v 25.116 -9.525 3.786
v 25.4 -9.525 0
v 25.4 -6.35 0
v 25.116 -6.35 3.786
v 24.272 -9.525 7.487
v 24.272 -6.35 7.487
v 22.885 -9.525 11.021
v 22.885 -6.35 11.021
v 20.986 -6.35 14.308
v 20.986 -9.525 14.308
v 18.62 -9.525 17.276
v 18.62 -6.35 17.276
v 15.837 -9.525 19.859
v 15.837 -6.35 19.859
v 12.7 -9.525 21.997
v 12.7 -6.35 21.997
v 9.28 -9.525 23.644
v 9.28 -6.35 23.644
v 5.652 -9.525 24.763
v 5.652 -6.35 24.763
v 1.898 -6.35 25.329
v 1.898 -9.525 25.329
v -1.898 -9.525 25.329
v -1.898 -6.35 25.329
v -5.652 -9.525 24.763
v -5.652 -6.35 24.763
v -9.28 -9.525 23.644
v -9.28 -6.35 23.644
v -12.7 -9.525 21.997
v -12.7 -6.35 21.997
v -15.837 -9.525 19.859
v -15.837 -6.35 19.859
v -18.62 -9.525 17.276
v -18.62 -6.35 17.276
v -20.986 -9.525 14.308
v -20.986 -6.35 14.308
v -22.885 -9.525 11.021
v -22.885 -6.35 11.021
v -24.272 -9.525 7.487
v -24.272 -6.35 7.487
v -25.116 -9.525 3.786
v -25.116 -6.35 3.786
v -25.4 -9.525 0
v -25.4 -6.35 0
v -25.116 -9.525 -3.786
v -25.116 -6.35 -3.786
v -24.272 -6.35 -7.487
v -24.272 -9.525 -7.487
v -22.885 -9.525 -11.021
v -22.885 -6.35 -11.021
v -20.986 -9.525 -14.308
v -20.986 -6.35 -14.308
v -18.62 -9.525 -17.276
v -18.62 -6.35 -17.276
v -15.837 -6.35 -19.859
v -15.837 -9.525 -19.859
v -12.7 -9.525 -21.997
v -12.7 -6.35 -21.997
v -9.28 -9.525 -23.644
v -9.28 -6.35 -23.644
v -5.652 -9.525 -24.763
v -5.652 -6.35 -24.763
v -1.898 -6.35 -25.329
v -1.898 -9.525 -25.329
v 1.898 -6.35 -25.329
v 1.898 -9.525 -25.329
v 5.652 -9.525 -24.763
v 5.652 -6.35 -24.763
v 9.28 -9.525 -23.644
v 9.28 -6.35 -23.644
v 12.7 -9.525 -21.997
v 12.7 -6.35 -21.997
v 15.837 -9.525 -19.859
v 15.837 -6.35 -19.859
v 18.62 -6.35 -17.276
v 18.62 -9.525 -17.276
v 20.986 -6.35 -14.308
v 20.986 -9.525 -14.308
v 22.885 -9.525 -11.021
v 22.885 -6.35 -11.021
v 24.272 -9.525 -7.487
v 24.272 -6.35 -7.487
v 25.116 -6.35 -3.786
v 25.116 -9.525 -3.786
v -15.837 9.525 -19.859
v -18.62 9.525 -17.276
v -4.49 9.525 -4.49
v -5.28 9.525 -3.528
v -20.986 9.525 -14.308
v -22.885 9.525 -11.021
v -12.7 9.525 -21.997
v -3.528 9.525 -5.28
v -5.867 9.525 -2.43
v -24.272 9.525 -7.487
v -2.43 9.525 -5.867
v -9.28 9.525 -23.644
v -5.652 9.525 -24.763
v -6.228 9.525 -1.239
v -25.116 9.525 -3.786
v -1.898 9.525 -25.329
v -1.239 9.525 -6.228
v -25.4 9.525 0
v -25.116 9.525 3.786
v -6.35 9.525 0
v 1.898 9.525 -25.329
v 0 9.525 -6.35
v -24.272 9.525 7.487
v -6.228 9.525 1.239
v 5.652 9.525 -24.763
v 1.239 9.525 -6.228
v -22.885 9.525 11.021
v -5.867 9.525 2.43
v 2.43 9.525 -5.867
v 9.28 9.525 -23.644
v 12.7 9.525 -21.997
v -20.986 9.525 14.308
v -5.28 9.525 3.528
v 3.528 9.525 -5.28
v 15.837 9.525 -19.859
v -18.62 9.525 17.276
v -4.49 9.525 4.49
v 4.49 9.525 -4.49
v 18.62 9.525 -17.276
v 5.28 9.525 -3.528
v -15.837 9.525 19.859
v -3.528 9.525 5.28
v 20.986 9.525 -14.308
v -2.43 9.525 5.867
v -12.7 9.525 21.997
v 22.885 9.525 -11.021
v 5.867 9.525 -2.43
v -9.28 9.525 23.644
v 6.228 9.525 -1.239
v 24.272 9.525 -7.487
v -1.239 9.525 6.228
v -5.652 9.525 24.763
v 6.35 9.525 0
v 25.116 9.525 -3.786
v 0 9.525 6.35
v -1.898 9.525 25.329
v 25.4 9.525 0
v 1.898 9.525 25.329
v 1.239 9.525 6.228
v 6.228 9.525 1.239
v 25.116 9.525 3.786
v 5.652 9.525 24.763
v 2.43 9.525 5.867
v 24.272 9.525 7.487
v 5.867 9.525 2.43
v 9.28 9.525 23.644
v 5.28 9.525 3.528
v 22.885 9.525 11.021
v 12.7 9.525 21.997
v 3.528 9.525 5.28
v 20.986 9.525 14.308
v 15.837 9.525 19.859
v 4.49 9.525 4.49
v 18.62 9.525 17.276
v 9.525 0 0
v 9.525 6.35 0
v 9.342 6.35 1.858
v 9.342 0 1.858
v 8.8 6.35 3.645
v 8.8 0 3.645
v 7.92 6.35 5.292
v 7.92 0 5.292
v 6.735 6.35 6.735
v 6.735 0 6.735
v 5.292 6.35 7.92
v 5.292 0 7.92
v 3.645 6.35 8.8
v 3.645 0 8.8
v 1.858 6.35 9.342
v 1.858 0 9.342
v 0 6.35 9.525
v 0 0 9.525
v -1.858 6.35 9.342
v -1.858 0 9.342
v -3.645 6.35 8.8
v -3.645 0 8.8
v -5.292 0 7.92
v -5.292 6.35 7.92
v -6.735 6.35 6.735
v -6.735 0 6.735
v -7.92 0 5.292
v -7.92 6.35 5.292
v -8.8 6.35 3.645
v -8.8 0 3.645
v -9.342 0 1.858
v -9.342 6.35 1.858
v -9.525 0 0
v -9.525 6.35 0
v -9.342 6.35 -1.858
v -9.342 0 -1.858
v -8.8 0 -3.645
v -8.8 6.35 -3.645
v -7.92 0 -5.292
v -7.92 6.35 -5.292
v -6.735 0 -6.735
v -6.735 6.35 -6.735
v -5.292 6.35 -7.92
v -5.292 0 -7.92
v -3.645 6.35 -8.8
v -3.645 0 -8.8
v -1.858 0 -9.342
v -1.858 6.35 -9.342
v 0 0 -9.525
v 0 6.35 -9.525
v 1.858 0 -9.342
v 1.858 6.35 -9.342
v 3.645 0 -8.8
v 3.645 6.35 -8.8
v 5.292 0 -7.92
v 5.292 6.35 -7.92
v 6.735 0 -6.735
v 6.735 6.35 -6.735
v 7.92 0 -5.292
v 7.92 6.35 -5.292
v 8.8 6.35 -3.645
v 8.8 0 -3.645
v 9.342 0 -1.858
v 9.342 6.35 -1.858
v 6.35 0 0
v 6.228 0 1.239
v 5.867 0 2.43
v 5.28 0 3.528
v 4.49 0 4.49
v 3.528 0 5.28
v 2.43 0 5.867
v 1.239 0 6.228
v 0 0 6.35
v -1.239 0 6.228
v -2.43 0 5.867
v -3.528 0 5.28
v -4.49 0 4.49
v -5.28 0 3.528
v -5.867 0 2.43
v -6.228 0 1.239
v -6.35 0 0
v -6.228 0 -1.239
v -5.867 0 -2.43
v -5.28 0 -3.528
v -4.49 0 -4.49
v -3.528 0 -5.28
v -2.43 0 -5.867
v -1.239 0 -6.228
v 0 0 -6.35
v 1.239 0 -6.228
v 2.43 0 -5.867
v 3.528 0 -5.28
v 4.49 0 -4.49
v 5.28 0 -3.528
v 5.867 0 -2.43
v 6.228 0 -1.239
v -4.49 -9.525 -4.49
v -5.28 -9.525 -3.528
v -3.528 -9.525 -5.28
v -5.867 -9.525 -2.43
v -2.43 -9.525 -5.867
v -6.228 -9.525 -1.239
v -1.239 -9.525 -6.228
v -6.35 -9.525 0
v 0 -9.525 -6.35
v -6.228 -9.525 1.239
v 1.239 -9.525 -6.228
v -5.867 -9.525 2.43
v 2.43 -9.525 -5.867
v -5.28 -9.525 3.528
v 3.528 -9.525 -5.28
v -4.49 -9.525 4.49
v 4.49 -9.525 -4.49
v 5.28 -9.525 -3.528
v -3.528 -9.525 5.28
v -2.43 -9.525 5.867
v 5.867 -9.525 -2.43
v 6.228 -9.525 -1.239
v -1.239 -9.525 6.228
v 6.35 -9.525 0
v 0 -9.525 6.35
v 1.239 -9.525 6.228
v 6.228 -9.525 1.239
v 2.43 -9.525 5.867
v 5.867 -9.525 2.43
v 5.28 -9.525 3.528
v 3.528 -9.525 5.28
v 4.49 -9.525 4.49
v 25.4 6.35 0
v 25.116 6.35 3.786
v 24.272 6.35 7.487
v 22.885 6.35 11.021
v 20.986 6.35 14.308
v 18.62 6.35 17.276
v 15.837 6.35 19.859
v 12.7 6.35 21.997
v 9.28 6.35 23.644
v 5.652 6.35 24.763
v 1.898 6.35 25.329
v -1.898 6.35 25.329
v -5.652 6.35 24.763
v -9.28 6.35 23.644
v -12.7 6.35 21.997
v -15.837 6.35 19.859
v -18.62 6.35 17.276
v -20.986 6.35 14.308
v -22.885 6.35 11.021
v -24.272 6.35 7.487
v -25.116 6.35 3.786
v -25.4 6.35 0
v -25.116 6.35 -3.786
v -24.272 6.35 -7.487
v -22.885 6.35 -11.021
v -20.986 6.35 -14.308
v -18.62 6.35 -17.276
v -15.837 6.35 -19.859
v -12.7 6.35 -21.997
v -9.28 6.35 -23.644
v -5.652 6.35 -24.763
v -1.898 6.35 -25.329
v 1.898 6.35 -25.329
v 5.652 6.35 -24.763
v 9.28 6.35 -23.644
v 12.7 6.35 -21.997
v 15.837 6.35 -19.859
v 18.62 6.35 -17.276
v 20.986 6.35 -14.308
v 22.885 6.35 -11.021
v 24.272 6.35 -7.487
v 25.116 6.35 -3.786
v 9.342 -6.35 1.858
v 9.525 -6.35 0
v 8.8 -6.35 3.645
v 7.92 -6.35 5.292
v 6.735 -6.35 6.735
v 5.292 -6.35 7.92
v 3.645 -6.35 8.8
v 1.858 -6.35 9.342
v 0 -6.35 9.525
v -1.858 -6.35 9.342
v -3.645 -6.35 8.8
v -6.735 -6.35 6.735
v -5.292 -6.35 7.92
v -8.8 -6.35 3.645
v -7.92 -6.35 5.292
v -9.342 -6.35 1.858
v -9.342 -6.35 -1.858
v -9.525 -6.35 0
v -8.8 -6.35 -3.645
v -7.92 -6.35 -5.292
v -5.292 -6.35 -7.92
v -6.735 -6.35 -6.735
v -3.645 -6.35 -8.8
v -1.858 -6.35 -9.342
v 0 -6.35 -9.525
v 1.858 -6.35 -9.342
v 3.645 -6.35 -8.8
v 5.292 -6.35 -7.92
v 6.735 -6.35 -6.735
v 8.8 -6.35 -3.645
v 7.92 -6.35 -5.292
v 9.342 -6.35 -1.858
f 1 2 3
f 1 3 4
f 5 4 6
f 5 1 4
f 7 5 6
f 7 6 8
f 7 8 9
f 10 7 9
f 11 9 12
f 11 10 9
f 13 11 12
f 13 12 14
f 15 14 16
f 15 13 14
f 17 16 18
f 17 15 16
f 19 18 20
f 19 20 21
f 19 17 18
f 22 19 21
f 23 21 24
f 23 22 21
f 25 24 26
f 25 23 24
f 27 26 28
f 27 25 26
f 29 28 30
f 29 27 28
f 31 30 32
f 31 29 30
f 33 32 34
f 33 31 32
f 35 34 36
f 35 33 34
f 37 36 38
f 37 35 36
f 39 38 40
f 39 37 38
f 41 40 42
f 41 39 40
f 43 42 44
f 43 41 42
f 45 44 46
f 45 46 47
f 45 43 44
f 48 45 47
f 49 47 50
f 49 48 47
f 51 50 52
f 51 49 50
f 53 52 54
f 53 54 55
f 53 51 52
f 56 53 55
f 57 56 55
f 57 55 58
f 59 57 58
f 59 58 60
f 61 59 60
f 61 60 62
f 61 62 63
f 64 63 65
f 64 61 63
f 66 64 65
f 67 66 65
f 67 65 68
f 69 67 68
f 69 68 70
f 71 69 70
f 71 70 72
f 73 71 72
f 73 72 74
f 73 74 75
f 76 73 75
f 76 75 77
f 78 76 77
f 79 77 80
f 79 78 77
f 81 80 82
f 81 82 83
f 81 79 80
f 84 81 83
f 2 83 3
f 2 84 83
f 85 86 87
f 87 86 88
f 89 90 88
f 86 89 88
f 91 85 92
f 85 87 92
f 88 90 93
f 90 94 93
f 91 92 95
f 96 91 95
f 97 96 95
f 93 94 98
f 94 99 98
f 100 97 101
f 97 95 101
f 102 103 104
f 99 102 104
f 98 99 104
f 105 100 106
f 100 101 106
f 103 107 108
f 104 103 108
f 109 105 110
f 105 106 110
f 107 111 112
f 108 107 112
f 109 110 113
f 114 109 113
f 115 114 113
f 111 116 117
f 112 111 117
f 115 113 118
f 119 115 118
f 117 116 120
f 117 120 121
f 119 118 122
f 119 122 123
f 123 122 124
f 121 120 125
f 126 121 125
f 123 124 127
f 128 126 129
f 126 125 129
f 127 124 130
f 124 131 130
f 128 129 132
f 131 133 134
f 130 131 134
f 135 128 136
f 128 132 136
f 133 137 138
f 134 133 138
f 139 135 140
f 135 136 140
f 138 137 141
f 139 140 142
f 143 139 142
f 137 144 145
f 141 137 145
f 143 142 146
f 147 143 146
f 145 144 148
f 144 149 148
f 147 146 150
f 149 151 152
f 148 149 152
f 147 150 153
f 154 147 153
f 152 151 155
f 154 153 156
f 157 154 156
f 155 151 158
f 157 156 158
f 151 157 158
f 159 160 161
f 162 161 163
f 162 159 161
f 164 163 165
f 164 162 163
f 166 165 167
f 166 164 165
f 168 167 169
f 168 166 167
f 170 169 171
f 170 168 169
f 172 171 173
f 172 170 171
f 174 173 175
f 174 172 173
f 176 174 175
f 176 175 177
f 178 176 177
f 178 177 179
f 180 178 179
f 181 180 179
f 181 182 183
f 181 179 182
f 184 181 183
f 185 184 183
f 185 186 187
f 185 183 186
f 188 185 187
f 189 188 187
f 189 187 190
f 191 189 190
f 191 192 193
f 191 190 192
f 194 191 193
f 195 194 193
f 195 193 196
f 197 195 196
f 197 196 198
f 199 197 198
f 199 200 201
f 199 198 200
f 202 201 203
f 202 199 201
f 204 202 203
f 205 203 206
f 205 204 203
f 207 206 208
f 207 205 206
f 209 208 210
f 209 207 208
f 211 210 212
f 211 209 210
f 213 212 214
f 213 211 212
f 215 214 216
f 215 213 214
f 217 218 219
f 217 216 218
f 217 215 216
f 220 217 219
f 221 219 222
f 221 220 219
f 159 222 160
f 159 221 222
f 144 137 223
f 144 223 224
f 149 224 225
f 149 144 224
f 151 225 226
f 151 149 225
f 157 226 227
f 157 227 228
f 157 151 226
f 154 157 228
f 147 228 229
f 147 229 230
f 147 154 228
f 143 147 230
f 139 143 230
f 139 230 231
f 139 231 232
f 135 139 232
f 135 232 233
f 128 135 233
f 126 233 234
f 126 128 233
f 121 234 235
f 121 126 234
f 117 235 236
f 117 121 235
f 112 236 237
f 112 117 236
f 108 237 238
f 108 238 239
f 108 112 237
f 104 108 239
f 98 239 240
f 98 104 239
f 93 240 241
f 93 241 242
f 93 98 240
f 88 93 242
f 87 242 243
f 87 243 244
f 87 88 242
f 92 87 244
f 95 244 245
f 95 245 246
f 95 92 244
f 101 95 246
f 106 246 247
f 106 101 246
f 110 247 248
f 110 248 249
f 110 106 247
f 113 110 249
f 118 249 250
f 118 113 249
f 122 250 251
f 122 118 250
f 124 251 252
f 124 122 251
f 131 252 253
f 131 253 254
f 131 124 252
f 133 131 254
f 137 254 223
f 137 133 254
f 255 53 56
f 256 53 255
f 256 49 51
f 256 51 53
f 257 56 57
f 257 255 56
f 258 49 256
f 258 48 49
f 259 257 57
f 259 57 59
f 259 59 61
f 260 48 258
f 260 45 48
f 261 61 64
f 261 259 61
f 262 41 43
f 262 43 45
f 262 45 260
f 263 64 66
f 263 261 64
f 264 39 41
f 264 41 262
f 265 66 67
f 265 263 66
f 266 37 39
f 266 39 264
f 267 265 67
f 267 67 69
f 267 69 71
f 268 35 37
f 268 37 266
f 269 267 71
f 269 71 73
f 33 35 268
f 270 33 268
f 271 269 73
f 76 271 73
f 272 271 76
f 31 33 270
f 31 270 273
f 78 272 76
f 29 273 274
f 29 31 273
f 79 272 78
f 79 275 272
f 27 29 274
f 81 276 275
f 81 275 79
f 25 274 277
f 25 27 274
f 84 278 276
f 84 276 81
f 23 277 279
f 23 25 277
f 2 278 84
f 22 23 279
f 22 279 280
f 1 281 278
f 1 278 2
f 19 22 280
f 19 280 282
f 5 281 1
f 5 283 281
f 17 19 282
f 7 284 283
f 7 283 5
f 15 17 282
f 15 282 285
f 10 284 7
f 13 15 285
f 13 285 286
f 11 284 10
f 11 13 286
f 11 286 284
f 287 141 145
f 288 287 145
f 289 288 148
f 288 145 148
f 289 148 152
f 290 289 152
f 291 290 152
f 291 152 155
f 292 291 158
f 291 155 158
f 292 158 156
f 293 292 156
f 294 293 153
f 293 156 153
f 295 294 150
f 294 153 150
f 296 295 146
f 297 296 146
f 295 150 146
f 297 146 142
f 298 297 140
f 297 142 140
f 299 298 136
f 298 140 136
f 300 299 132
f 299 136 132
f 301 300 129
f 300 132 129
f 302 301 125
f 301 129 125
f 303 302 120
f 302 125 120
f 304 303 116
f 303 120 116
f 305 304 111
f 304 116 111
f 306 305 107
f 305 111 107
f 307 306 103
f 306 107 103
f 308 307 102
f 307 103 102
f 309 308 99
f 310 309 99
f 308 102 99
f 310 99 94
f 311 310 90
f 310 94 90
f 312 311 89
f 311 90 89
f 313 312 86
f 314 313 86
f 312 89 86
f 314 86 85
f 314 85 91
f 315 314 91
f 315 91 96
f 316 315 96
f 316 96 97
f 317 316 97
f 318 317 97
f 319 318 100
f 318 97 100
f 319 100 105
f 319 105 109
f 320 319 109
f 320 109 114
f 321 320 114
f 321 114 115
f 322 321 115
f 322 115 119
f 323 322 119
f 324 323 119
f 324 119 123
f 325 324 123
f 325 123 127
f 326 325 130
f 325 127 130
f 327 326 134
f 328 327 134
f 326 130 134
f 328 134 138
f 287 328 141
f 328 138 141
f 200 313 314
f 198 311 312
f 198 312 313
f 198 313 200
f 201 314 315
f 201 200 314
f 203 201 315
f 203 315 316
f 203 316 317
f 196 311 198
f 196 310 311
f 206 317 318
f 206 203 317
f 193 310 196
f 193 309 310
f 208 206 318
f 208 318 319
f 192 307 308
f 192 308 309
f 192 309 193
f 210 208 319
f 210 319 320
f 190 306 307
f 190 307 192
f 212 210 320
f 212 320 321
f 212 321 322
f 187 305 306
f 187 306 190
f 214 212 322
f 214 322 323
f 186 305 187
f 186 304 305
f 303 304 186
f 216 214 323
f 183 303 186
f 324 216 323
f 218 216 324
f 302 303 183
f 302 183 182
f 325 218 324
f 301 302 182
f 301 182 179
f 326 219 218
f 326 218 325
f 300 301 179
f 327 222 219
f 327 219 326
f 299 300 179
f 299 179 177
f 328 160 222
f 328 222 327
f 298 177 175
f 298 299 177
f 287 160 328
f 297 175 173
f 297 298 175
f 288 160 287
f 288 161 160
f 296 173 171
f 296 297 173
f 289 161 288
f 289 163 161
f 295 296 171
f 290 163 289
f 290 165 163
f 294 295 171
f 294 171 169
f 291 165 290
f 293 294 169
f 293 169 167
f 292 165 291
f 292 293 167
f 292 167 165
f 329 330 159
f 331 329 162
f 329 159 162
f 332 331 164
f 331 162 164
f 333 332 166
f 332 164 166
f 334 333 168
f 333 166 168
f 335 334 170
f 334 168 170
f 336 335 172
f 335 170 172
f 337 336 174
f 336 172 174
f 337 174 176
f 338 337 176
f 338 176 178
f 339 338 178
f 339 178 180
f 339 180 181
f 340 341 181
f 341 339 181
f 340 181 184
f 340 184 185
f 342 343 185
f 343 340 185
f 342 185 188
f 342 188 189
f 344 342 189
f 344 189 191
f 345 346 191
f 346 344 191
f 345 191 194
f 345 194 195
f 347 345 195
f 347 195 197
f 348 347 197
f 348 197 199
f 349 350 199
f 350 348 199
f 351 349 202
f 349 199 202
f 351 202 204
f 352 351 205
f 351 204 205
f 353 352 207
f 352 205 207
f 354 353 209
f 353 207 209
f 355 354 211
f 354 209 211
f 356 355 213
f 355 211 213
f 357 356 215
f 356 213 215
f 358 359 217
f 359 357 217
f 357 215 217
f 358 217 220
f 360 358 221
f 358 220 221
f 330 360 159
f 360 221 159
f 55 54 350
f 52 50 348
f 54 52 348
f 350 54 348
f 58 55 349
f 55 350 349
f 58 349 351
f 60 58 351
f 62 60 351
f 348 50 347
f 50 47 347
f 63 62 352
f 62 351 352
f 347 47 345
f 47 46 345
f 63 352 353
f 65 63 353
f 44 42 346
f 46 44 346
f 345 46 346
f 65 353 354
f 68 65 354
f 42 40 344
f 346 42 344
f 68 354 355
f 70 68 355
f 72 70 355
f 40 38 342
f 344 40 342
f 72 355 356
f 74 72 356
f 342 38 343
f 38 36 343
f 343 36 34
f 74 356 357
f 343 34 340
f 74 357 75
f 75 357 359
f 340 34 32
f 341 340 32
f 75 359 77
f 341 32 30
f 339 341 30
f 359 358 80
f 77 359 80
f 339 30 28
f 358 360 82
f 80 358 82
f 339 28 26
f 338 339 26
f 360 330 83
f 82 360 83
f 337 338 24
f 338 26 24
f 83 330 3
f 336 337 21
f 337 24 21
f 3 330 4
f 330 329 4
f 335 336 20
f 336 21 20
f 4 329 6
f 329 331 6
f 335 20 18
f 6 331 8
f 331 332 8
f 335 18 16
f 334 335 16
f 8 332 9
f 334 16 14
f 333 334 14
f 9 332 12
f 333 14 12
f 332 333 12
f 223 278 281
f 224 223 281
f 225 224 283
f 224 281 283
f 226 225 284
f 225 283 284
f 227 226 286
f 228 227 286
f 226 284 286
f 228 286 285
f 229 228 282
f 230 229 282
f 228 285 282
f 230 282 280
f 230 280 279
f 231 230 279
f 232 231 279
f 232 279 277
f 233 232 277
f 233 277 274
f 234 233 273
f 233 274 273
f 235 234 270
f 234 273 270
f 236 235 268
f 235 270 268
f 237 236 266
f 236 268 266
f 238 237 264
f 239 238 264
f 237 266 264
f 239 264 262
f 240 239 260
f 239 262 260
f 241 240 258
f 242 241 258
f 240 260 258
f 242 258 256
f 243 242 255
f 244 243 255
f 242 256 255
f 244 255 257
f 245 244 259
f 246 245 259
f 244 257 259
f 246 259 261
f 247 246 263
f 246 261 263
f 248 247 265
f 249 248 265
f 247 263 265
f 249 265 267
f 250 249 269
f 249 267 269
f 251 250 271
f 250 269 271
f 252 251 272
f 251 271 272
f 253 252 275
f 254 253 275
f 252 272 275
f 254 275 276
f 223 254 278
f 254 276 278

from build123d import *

# Parameters (mm, degrees)
F0_R     = 9.525
F1_DEPTH = 9.525
F2_R     = 25.4
F3_DEPTH = 3.175
F4_R     = 6.35
F5_DEPTH = 12.7


# Not quite as in the source:
# - a length typed as a fraction of an inch, garbled in the dataset ("3 / 203.2 mm" for 3/8 in), is restored


with BuildPart() as f1:
    # F0 (on Front) → F1 (new body)
    with BuildSketch(Plane.XZ):
        Circle(F0_R)
    extrude(amount=F1_DEPTH)

    # F2 (on face) → F3 (join)
    with BuildSketch(Plane.XZ.offset(9.525)):
        Circle(F2_R)
    extrude(amount=-F3_DEPTH)

    # F4 (on face) → F5 (cut, symmetric)
    with BuildSketch(Plane.XZ.offset(9.525)):
        Circle(F4_R)
    extrude(amount=F5_DEPTH, both=True, mode=Mode.SUBTRACT)

    # F6: F1 across plane


with BuildPart() as f1_1:
    add(f1.part)
    add(f1.part.mirror(Plane.XZ))


solid = f1_1.part
